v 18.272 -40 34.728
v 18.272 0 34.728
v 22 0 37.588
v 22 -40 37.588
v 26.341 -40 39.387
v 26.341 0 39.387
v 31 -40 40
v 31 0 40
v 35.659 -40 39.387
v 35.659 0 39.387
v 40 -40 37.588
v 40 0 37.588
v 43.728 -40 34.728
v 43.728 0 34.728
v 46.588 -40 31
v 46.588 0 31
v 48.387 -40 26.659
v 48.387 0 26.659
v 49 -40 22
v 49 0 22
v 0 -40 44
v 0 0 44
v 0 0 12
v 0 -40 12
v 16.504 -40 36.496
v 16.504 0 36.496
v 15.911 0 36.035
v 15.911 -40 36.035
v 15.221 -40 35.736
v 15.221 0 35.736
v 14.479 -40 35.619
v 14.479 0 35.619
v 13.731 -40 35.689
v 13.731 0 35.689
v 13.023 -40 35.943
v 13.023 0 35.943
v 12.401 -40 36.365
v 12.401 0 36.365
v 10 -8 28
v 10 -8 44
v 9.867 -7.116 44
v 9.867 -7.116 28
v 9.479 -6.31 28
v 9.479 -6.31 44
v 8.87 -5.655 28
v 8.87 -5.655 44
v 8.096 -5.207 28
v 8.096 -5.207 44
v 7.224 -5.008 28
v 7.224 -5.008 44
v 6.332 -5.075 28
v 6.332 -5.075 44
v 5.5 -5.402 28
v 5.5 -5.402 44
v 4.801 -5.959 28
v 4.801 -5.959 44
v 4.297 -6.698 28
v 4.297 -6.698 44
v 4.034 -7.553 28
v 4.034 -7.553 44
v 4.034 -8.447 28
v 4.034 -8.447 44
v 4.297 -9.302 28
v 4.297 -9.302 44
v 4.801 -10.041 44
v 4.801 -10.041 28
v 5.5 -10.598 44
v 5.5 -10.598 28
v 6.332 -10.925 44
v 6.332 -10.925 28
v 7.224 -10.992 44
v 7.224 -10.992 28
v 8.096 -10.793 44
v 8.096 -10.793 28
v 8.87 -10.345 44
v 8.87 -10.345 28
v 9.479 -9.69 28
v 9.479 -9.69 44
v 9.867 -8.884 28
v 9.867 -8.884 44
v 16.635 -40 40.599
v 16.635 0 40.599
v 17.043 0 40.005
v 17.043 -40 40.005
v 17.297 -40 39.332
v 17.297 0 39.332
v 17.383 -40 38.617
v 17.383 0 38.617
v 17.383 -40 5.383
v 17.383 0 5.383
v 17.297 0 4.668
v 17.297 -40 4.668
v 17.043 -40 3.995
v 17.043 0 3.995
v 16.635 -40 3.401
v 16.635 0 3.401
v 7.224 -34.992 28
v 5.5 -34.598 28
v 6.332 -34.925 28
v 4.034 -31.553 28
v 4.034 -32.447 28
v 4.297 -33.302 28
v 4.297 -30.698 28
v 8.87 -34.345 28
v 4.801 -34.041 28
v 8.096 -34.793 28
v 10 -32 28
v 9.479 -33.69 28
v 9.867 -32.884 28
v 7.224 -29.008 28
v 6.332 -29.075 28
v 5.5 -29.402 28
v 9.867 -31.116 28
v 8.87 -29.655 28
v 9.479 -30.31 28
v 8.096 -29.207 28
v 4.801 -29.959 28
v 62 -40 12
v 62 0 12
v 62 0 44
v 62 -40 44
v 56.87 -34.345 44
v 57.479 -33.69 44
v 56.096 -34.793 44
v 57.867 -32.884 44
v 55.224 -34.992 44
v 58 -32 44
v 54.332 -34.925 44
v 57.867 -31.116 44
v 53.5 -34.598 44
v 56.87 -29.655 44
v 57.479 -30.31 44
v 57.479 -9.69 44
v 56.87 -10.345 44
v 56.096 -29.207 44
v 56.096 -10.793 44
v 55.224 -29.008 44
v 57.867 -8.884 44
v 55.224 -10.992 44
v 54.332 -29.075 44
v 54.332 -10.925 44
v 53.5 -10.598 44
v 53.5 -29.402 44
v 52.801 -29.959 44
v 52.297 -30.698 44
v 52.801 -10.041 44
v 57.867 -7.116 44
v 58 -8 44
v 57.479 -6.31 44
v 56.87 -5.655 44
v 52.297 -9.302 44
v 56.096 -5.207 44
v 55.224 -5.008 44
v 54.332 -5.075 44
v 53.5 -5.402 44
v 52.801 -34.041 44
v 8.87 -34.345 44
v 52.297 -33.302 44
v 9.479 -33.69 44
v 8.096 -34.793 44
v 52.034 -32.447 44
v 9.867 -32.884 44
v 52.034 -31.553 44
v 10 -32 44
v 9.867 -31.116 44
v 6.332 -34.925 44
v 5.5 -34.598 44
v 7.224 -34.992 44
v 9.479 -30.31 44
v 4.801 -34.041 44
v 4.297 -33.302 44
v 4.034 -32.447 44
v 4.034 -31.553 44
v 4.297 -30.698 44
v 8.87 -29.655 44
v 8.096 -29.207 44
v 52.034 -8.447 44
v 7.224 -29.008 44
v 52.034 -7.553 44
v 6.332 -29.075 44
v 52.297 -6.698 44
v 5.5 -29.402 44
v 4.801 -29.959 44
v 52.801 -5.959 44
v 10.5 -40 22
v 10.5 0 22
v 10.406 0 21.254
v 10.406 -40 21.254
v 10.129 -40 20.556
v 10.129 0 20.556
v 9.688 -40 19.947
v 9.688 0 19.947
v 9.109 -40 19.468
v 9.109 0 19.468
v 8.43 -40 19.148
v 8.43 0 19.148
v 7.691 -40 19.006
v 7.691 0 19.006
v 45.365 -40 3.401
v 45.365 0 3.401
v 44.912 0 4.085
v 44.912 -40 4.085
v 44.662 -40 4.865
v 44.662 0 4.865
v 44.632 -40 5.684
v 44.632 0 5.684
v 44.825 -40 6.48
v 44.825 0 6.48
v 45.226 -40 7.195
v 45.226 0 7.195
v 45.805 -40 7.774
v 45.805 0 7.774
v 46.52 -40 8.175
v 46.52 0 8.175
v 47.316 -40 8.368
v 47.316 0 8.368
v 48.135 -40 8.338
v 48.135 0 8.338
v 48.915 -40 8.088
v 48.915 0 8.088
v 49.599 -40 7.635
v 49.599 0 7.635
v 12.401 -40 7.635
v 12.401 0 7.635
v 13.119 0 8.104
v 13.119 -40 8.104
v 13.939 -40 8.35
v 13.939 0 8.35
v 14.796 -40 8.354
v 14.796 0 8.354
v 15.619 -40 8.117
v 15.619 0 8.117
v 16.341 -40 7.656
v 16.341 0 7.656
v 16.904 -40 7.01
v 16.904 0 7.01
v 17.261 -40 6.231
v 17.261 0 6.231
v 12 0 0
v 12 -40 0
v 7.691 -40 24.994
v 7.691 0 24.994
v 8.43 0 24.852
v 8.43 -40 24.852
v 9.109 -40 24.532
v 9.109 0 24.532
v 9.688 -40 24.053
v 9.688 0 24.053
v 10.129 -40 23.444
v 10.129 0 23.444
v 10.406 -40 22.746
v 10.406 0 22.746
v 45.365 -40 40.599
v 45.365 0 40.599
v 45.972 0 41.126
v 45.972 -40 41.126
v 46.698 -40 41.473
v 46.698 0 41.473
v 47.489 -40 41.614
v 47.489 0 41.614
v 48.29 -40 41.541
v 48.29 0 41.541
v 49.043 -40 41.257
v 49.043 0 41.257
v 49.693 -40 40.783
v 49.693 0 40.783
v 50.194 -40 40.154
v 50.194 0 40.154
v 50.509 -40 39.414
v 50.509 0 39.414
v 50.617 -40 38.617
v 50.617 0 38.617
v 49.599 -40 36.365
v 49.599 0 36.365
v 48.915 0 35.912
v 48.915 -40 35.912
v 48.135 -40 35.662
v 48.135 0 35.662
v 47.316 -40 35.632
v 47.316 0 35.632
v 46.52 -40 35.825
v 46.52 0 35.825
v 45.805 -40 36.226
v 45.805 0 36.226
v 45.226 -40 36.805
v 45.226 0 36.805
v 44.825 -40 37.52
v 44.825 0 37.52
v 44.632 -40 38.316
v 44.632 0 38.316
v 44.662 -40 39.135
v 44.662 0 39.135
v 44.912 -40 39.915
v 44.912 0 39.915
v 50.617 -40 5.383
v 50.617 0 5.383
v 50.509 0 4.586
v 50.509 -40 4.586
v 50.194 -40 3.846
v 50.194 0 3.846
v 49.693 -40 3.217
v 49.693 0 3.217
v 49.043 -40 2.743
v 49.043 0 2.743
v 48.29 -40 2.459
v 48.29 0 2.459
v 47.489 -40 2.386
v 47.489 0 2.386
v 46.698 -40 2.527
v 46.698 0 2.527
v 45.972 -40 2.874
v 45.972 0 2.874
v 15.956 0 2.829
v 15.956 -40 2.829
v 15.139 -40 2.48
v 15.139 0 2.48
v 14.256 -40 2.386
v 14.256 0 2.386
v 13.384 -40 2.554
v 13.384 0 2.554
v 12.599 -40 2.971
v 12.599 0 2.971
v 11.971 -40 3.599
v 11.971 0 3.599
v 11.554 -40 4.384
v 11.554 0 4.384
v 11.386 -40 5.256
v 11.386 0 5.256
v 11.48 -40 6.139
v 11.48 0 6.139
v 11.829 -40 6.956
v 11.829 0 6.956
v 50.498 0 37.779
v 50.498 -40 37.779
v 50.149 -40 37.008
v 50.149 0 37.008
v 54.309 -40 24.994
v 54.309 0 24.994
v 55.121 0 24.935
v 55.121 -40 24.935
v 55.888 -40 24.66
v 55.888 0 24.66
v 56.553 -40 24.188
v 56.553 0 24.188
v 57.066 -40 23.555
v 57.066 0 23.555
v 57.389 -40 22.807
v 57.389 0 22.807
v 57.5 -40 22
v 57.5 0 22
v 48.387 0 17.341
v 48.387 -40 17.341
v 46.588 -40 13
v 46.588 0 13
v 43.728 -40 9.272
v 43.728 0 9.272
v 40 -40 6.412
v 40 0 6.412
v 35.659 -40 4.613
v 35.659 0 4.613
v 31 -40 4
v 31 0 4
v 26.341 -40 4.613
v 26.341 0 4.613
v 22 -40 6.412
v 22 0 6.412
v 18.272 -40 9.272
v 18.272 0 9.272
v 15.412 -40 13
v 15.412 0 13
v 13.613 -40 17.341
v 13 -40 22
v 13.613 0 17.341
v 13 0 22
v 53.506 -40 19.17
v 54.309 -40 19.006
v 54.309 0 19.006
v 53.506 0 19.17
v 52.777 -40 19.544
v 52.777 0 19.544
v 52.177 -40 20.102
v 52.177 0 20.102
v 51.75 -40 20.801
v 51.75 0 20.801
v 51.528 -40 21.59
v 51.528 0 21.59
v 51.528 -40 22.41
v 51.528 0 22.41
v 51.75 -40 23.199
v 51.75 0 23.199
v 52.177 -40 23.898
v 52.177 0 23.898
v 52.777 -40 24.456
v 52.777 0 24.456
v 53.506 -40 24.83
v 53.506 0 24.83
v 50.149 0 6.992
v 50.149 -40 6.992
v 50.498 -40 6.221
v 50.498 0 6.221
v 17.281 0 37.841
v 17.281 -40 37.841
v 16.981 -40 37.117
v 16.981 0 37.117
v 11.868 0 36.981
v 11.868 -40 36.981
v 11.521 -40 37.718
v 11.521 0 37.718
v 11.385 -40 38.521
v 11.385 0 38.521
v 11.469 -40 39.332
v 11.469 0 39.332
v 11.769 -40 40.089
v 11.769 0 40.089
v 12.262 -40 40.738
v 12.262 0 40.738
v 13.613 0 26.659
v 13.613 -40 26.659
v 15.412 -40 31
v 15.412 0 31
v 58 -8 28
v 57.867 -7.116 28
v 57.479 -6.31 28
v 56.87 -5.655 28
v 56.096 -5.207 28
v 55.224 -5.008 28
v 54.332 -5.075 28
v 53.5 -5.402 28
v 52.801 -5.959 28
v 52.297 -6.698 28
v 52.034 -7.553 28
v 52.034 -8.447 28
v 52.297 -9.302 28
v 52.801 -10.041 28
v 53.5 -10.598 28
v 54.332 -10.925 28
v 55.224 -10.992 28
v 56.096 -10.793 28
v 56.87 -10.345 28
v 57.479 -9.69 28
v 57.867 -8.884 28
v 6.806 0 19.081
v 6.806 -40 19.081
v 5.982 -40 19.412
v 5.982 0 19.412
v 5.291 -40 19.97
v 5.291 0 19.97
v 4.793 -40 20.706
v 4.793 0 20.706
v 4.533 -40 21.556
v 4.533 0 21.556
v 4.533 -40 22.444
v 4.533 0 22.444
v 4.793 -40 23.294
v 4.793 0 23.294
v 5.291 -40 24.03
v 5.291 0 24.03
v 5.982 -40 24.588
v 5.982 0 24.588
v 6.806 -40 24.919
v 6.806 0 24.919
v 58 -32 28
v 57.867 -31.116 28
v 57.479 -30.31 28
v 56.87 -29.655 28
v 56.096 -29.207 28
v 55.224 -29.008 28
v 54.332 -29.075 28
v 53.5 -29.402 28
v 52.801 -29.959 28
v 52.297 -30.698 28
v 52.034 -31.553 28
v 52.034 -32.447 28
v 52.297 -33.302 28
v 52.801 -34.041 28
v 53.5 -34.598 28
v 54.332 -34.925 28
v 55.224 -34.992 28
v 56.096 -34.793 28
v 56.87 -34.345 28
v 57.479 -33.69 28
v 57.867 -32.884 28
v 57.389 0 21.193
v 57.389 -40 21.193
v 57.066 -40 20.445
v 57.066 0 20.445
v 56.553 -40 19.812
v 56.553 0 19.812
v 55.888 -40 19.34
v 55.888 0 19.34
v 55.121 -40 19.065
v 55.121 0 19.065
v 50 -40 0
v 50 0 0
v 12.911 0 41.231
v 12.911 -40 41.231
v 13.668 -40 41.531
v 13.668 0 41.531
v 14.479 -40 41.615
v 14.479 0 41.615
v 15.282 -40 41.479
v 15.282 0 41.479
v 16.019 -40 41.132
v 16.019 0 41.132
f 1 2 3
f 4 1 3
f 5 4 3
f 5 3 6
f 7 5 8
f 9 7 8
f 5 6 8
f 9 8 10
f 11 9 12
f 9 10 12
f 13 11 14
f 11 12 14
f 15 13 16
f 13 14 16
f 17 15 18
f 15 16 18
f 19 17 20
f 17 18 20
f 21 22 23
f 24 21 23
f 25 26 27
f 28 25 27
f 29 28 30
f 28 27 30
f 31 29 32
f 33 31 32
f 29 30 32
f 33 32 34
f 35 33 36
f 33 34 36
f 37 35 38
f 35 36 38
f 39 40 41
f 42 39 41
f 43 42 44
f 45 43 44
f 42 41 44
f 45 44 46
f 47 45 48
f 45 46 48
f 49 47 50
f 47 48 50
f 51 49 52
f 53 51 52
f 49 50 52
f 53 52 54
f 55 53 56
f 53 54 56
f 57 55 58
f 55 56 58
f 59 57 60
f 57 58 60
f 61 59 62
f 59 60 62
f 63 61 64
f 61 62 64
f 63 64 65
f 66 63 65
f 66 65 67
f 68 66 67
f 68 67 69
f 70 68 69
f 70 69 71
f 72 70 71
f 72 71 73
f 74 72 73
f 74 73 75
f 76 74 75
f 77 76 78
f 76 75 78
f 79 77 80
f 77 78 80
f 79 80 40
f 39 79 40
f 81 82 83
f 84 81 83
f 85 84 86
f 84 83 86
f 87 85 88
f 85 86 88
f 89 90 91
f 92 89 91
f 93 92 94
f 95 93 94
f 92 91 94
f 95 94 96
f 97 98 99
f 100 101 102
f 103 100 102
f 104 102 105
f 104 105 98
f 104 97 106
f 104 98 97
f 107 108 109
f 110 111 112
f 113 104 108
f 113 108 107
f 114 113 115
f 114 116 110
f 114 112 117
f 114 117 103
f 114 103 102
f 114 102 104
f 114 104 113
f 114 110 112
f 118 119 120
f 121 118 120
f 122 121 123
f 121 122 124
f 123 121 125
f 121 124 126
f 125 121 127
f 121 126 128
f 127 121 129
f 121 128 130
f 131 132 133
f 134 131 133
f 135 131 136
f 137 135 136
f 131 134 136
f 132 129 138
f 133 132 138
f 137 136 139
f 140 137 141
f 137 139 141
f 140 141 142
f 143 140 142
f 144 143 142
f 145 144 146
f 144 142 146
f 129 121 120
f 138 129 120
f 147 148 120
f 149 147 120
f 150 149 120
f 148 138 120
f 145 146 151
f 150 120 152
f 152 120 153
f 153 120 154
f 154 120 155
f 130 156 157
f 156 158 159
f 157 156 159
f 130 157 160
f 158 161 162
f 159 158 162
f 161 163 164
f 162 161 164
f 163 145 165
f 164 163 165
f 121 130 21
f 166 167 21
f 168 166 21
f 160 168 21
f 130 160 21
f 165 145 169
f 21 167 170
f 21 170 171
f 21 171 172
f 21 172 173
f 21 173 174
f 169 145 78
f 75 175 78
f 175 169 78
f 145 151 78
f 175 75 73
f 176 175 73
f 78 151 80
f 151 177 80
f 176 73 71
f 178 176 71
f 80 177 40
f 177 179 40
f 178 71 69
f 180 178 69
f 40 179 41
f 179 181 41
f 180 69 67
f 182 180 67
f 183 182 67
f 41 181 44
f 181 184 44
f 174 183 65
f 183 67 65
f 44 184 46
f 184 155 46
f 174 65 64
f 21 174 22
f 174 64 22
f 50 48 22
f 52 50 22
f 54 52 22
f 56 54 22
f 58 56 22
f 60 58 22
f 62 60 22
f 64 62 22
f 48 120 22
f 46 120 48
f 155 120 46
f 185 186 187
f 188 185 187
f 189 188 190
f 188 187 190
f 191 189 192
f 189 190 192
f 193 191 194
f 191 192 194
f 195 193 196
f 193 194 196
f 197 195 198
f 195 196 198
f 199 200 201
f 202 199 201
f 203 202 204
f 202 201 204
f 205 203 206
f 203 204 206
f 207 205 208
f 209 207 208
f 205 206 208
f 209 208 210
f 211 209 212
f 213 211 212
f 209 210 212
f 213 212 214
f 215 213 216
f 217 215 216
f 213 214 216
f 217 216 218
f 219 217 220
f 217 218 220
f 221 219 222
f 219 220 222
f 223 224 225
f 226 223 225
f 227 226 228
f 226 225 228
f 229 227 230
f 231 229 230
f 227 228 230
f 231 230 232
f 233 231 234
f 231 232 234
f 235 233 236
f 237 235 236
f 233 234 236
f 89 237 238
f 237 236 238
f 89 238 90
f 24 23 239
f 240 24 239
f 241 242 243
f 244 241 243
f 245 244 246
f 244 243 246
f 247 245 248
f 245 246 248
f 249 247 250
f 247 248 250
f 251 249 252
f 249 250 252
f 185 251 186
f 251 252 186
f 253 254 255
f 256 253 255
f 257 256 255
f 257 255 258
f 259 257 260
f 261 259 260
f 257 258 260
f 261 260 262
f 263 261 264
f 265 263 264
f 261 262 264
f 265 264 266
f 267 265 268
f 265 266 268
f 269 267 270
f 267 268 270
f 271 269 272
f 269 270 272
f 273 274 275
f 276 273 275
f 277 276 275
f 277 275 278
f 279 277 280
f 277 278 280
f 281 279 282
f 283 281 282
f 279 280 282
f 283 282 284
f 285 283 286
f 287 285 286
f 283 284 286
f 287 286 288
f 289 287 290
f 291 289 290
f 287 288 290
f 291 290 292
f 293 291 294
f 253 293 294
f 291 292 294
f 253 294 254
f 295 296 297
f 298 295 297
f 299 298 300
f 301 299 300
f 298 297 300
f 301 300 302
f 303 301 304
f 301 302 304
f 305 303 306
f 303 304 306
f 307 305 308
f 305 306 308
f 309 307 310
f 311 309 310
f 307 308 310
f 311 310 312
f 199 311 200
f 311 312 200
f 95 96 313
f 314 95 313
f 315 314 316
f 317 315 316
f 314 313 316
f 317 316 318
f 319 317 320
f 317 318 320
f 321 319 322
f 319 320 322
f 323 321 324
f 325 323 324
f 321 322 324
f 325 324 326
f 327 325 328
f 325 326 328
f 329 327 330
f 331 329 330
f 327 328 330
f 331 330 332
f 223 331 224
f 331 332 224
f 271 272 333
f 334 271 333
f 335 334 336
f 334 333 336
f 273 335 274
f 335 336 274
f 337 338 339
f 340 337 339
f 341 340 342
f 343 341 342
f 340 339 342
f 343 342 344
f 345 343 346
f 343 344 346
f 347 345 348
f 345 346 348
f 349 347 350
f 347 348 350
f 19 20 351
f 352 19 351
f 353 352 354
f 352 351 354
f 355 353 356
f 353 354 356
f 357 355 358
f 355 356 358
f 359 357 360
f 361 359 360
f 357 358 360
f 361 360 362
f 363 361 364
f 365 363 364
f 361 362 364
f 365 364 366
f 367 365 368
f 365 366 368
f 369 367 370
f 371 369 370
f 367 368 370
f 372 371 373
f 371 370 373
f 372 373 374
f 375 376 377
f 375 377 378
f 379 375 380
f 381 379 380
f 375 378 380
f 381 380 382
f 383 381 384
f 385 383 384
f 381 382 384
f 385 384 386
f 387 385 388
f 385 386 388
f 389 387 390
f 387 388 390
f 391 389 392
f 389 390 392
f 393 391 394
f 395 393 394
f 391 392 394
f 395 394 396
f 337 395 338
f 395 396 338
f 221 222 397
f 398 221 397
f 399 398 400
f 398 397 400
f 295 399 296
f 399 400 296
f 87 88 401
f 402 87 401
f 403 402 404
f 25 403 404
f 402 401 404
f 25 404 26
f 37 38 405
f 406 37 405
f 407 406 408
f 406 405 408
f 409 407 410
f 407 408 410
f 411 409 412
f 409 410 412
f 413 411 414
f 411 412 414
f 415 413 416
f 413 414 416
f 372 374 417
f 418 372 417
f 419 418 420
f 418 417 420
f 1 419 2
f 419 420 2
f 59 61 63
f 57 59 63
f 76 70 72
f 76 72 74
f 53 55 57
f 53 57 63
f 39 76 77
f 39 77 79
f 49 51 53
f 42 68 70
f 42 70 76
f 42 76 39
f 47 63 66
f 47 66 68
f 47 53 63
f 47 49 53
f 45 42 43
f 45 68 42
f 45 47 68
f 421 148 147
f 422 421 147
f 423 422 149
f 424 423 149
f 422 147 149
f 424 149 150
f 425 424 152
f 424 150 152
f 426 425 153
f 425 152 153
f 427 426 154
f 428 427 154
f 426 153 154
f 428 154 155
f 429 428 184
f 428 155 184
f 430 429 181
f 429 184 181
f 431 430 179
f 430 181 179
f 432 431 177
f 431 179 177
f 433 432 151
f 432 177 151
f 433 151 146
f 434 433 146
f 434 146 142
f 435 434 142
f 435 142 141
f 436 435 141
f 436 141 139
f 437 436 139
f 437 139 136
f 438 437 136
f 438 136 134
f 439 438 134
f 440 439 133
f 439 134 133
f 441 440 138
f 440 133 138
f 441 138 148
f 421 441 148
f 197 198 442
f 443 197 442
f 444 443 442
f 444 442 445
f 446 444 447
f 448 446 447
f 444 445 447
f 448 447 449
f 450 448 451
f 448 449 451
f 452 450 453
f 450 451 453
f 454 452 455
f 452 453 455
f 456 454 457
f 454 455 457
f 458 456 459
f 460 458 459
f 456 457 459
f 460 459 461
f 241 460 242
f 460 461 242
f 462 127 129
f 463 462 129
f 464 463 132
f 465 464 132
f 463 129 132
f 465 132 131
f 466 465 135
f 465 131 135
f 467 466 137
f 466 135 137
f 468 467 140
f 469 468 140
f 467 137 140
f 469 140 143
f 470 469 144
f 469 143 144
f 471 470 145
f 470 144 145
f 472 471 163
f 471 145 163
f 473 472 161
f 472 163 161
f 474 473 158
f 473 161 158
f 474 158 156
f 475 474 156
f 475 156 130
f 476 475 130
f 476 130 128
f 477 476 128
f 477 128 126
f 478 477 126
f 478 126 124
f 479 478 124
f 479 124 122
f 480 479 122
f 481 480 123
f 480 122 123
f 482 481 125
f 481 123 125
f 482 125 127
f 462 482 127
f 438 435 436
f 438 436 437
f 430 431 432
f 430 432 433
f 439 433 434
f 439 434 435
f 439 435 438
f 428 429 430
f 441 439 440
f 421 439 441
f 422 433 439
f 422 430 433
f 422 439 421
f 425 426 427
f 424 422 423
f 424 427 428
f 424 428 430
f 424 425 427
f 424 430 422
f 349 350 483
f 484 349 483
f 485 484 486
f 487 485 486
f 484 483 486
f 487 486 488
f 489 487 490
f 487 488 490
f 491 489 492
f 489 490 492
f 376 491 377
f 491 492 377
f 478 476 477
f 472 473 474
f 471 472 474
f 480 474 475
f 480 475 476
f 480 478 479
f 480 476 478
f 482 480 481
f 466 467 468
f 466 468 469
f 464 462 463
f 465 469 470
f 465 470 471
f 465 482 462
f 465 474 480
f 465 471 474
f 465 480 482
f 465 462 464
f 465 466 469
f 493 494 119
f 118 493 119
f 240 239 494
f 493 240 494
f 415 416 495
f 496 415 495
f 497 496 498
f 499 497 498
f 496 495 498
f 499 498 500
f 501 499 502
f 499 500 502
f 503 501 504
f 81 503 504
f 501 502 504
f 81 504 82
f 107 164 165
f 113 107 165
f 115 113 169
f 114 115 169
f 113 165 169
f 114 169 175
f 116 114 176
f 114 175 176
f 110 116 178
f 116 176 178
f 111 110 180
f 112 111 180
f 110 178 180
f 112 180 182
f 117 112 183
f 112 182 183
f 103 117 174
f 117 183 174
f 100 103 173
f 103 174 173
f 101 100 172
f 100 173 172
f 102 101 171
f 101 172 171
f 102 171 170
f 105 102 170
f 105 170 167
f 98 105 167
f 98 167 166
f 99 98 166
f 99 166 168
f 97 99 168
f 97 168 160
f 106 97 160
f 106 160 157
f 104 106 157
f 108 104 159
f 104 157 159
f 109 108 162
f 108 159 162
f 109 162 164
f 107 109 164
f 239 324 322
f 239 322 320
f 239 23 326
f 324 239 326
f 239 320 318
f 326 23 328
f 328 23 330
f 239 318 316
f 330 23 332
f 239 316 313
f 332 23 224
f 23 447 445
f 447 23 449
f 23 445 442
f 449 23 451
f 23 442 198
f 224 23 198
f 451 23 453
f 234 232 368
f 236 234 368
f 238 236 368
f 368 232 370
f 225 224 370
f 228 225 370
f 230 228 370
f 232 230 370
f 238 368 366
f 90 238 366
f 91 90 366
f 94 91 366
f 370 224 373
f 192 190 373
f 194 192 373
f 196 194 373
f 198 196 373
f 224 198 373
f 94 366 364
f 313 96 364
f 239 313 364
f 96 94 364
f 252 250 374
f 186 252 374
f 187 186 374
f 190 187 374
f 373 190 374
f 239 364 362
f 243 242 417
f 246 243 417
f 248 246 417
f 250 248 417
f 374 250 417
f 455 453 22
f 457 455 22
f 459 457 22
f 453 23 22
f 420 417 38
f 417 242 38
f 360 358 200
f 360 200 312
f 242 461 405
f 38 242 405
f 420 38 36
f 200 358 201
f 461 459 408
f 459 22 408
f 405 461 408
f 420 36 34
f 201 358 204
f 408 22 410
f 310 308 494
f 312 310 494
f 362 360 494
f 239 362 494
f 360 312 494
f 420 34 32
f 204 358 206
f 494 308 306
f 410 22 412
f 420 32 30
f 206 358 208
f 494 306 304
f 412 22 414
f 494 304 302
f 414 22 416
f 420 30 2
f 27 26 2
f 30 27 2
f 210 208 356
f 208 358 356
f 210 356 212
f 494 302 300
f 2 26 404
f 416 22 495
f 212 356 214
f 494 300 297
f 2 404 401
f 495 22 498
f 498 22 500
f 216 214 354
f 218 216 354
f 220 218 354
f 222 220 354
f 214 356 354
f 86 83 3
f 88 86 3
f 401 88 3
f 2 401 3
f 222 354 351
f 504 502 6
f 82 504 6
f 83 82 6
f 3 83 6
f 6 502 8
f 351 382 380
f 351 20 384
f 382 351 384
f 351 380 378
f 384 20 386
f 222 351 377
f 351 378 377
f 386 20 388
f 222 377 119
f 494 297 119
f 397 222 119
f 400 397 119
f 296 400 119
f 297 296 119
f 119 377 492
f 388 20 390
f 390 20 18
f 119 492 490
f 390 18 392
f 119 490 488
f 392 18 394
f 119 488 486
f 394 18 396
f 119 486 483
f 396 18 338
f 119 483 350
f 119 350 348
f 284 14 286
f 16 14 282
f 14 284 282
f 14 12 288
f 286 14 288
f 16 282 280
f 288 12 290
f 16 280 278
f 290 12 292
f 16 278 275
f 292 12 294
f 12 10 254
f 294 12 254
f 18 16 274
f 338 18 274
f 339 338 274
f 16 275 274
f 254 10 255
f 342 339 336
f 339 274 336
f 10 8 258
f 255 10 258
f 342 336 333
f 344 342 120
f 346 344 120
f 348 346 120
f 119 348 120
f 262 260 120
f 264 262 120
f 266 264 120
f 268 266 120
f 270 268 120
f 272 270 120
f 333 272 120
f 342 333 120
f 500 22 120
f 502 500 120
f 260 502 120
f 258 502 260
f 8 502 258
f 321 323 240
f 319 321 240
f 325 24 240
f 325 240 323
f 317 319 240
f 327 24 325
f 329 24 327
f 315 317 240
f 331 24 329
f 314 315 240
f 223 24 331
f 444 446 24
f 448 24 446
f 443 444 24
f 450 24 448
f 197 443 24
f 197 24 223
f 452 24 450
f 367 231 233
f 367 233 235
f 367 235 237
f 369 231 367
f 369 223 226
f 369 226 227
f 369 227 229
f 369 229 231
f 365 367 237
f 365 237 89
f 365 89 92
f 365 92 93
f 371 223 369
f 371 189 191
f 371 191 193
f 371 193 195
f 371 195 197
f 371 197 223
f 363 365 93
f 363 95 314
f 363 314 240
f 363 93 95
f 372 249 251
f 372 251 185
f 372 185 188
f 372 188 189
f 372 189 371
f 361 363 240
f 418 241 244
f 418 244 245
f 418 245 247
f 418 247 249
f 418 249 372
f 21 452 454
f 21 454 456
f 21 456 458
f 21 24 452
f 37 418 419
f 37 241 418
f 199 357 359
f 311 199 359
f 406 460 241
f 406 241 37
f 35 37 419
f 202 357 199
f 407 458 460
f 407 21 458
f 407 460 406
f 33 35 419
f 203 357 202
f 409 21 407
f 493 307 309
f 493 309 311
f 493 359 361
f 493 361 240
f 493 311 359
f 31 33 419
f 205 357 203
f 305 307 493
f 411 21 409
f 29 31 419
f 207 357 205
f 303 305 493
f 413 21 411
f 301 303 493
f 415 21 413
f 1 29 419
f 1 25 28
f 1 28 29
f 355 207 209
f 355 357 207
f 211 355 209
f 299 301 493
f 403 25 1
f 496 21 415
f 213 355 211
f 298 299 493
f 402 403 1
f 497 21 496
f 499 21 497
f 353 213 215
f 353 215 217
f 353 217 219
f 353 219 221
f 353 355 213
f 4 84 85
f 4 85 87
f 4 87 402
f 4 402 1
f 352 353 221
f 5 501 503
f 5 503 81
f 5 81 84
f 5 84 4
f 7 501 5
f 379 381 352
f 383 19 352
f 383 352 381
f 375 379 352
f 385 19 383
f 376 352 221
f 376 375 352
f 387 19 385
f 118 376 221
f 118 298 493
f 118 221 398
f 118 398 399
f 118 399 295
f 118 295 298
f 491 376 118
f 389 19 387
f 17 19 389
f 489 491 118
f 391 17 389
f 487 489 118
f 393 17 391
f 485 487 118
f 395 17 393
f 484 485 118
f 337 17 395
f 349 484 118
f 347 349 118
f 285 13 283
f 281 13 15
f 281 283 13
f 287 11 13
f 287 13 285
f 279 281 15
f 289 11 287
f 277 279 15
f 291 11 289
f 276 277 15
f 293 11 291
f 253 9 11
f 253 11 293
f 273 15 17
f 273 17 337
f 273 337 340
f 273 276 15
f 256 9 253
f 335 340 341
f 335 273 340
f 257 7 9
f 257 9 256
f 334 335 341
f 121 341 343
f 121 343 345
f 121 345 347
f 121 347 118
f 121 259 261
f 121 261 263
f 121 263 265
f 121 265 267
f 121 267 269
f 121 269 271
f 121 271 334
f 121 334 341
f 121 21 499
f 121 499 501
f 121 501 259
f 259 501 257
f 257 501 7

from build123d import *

# Parameters (mm, degrees)
F1_DEPTH = 40
F2_R     = 3
F3_DEPTH = 16


with BuildPart() as f1:
    # F0 (on Front) → F1 (new body)
    with BuildSketch(Plane.XZ):
        with BuildLine():
            Line((0, 12), (12, 0))
            Line((12, 0), (22.738644, 0))
            ThreePointArc((22.738644, 0), (19.559896, 1.472603), (16.635389, 3.4014))
            ThreePointArc((16.635389, 3.4014), (12.26167, 3.26167), (12.4014, 7.635389))
            ThreePointArc((12.4014, 7.635389), (9.288831, 13.006939), (7.691489, 19.006118))
            ThreePointArc((7.691489, 19.006118), (4.5, 22), (7.691489, 24.993882))
            ThreePointArc((7.691489, 24.993882), (9.288831, 30.993061), (12.4014, 36.364611))
            ThreePointArc((12.4014, 36.364611), (11.38452, 38.521216), (12.26167, 40.73833))
            ThreePointArc((12.26167, 40.73833), (14.478784, 41.61548), (16.635389, 40.5986))
            ThreePointArc((16.635389, 40.5986), (19.559896, 42.527397), (22.738644, 44))
            Line((22.738644, 44), (0, 44))
            Line((0, 44), (0, 12))
        make_face()
        with BuildLine():
            ThreePointArc((12.4014, 36.364611), (9.288831, 30.993061), (7.691489, 24.993882))
            ThreePointArc((7.691489, 24.993882), (9.687975, 24.052502), (10.5, 22))
            Line((10.5, 22), (13, 22))
            ThreePointArc((13, 22), (14.370168, 28.888302), (18.272078, 34.727922))
            Line((18.272078, 34.727922), (16.504311, 36.495689))
            ThreePointArc((16.504311, 36.495689), (14.478784, 35.618539), (12.4014, 36.364611))
        make_face()
        with BuildLine():
            ThreePointArc((16.635389, 3.4014), (19.559896, 1.472603), (22.738644, 0))
            Line((22.738644, 0), (39.261356, 0))
            ThreePointArc((39.261356, 0), (42.440104, 1.472603), (45.364611, 3.4014))
            ThreePointArc((45.364611, 3.4014), (45.495689, 7.504311), (49.5986, 7.635389))
            ThreePointArc((49.5986, 7.635389), (52.711169, 13.006939), (54.308511, 19.006118))
            ThreePointArc((54.308511, 19.006118), (51.5, 22), (54.308511, 24.993882))
            ThreePointArc((54.308511, 24.993882), (52.711169, 30.993061), (49.5986, 36.364611))
            ThreePointArc((49.5986, 36.364611), (45.495689, 36.495689), (45.364611, 40.5986))
            ThreePointArc((45.364611, 40.5986), (42.440104, 42.527397), (39.261356, 44))
            Line((39.261356, 44), (22.738644, 44))
            ThreePointArc((22.738644, 44), (19.559896, 42.527397), (16.635389, 40.5986))
            ThreePointArc((16.635389, 40.5986), (17.189874, 39.675973), (17.382991, 38.617009))
            ThreePointArc((17.382991, 38.617009), (17.154629, 37.468959), (16.504311, 36.495689))
            Line((16.504311, 36.495689), (18.272078, 34.727922))
            ThreePointArc((18.272078, 34.727922), (37.888302, 38.629832), (49, 22))
            ThreePointArc((49, 22), (31, 4), (13, 22))
            Line((13, 22), (10.5, 22))
            ThreePointArc((10.5, 22), (9.687975, 19.947498), (7.691489, 19.006118))
            ThreePointArc((7.691489, 19.006118), (9.288831, 13.006939), (12.4014, 7.635389))
            ThreePointArc((12.4014, 7.635389), (15.618957, 8.116557), (17.382991, 5.382991))
            ThreePointArc((17.382991, 5.382991), (17.189874, 4.324027), (16.635389, 3.4014))
        make_face()
        with BuildLine():
            ThreePointArc((45.364611, 3.4014), (42.440104, 1.472603), (39.261356, 0))
            Line((39.261356, 0), (50, 0))
            Line((50, 0), (62, 12))
            Line((62, 12), (62, 44))
            Line((62, 44), (39.261356, 44))
            ThreePointArc((39.261356, 44), (42.440104, 42.527397), (45.364611, 40.5986))
            ThreePointArc((45.364611, 40.5986), (48.675973, 41.423893), (50.617009, 38.617009))
            ThreePointArc((50.617009, 38.617009), (50.350576, 37.381043), (49.5986, 36.364611))
            ThreePointArc((49.5986, 36.364611), (52.711169, 30.993061), (54.308511, 24.993882))
            ThreePointArc((54.308511, 24.993882), (56.552502, 24.187975), (57.5, 22))
            ThreePointArc((57.5, 22), (56.552502, 19.812025), (54.308511, 19.006118))
            ThreePointArc((54.308511, 19.006118), (52.711169, 13.006939), (49.5986, 7.635389))
            ThreePointArc((49.5986, 7.635389), (50.350576, 6.618957), (50.617009, 5.382991))
            ThreePointArc((50.617009, 5.382991), (48.675973, 2.576107), (45.364611, 3.4014))
        make_face()
    extrude(amount=F1_DEPTH)

    # F2 (on face) → F3 (cut)
    with BuildSketch(Plane.XY.offset(44)):
        with Locations((7, -8)):
            Circle(F2_R)
        with Locations((7, -32)):
            Circle(F2_R)
        with Locations((55, -32)):
            Circle(F2_R)
        with Locations((55, -8)):
            Circle(F2_R)
    extrude(amount=-F3_DEPTH, mode=Mode.SUBTRACT)


solid = f1.part
